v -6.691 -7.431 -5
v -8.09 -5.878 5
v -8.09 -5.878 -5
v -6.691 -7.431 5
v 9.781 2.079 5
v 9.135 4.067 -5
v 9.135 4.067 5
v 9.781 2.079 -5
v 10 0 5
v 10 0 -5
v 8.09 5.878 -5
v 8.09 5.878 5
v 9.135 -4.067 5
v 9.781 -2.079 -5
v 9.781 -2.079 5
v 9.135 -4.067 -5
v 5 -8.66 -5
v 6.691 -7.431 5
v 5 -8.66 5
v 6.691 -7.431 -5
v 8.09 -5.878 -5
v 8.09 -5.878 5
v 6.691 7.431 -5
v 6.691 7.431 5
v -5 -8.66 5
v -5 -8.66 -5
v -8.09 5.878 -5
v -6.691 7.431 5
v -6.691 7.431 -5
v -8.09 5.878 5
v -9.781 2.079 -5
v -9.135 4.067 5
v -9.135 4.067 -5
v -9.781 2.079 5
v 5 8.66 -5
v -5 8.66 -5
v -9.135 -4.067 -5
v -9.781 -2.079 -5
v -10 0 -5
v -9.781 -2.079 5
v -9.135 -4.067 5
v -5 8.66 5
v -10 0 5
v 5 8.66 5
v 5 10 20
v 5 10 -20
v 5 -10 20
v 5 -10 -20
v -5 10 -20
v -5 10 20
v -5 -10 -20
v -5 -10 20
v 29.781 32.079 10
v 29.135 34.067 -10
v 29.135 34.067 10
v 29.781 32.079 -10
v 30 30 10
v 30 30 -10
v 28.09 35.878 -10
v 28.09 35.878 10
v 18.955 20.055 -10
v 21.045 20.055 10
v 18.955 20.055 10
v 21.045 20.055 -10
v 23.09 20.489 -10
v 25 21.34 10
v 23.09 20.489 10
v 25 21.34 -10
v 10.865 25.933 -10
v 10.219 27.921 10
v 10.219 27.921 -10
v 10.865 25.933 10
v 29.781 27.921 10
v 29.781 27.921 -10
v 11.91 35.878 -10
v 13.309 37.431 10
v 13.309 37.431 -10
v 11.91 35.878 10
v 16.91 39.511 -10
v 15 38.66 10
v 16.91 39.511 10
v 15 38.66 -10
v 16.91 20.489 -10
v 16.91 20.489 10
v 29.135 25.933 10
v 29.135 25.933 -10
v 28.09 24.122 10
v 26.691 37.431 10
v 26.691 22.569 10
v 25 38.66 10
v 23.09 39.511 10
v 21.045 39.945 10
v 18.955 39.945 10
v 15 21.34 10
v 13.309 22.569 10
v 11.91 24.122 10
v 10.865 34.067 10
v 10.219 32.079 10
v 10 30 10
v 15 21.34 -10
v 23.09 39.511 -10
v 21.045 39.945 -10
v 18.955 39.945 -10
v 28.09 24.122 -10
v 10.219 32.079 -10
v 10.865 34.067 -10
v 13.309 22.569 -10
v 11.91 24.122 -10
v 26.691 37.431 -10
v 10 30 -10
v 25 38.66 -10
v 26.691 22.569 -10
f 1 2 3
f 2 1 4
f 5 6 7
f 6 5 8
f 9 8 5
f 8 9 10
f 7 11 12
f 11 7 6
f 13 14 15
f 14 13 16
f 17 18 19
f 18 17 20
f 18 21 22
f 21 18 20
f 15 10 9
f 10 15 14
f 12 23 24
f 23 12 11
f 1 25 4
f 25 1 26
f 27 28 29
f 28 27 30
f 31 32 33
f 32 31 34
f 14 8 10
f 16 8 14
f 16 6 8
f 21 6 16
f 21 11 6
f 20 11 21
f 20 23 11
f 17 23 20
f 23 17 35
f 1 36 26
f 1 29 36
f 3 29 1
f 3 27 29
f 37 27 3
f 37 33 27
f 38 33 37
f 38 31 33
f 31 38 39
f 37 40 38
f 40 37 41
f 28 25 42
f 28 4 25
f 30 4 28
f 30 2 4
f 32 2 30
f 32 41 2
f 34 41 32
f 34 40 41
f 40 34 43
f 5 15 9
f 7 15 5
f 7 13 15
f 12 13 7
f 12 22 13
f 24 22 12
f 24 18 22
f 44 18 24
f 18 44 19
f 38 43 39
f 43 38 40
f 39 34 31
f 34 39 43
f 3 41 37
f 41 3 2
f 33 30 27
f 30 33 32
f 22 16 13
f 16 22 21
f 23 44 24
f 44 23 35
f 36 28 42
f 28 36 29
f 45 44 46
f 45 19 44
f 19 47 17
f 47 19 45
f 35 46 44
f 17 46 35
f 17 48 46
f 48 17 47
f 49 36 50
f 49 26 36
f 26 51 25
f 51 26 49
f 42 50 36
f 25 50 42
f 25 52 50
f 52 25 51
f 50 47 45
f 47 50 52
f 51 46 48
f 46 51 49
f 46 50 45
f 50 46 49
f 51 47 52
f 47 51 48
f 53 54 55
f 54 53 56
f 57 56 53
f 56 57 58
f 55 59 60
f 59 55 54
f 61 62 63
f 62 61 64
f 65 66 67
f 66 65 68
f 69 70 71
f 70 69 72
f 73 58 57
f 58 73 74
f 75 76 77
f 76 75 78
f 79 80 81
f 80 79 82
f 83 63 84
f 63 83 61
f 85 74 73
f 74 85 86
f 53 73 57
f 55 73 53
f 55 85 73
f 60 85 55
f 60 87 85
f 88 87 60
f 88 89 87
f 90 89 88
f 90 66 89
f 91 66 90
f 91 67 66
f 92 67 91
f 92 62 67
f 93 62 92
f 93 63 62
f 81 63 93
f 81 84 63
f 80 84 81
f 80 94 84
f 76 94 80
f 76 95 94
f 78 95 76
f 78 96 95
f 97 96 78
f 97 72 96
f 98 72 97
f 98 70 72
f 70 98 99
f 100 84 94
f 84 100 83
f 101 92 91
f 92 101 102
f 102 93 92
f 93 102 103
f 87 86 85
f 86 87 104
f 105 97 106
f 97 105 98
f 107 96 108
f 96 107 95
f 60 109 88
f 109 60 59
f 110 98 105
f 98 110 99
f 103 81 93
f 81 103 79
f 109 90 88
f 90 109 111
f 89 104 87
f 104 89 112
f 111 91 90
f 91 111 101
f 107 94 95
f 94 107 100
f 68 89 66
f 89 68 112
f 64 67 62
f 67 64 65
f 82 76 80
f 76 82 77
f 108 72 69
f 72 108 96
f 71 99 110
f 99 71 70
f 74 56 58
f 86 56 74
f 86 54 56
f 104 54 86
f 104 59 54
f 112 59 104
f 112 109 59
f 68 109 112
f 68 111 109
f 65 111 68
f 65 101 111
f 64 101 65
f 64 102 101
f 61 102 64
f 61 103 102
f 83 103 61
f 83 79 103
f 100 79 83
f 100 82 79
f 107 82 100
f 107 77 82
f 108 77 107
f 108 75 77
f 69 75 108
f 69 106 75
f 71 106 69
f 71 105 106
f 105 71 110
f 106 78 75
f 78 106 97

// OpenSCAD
cube([10,20,40], center=true);


difference() {
	color("red") {
		cylinder(r=10, h=10, center=true);

	}

	cube(size=[10, 10, 10], center=true);

}

translate([20, 30, 0]) {
cylinder(r=10, h=20, center=true);
}
